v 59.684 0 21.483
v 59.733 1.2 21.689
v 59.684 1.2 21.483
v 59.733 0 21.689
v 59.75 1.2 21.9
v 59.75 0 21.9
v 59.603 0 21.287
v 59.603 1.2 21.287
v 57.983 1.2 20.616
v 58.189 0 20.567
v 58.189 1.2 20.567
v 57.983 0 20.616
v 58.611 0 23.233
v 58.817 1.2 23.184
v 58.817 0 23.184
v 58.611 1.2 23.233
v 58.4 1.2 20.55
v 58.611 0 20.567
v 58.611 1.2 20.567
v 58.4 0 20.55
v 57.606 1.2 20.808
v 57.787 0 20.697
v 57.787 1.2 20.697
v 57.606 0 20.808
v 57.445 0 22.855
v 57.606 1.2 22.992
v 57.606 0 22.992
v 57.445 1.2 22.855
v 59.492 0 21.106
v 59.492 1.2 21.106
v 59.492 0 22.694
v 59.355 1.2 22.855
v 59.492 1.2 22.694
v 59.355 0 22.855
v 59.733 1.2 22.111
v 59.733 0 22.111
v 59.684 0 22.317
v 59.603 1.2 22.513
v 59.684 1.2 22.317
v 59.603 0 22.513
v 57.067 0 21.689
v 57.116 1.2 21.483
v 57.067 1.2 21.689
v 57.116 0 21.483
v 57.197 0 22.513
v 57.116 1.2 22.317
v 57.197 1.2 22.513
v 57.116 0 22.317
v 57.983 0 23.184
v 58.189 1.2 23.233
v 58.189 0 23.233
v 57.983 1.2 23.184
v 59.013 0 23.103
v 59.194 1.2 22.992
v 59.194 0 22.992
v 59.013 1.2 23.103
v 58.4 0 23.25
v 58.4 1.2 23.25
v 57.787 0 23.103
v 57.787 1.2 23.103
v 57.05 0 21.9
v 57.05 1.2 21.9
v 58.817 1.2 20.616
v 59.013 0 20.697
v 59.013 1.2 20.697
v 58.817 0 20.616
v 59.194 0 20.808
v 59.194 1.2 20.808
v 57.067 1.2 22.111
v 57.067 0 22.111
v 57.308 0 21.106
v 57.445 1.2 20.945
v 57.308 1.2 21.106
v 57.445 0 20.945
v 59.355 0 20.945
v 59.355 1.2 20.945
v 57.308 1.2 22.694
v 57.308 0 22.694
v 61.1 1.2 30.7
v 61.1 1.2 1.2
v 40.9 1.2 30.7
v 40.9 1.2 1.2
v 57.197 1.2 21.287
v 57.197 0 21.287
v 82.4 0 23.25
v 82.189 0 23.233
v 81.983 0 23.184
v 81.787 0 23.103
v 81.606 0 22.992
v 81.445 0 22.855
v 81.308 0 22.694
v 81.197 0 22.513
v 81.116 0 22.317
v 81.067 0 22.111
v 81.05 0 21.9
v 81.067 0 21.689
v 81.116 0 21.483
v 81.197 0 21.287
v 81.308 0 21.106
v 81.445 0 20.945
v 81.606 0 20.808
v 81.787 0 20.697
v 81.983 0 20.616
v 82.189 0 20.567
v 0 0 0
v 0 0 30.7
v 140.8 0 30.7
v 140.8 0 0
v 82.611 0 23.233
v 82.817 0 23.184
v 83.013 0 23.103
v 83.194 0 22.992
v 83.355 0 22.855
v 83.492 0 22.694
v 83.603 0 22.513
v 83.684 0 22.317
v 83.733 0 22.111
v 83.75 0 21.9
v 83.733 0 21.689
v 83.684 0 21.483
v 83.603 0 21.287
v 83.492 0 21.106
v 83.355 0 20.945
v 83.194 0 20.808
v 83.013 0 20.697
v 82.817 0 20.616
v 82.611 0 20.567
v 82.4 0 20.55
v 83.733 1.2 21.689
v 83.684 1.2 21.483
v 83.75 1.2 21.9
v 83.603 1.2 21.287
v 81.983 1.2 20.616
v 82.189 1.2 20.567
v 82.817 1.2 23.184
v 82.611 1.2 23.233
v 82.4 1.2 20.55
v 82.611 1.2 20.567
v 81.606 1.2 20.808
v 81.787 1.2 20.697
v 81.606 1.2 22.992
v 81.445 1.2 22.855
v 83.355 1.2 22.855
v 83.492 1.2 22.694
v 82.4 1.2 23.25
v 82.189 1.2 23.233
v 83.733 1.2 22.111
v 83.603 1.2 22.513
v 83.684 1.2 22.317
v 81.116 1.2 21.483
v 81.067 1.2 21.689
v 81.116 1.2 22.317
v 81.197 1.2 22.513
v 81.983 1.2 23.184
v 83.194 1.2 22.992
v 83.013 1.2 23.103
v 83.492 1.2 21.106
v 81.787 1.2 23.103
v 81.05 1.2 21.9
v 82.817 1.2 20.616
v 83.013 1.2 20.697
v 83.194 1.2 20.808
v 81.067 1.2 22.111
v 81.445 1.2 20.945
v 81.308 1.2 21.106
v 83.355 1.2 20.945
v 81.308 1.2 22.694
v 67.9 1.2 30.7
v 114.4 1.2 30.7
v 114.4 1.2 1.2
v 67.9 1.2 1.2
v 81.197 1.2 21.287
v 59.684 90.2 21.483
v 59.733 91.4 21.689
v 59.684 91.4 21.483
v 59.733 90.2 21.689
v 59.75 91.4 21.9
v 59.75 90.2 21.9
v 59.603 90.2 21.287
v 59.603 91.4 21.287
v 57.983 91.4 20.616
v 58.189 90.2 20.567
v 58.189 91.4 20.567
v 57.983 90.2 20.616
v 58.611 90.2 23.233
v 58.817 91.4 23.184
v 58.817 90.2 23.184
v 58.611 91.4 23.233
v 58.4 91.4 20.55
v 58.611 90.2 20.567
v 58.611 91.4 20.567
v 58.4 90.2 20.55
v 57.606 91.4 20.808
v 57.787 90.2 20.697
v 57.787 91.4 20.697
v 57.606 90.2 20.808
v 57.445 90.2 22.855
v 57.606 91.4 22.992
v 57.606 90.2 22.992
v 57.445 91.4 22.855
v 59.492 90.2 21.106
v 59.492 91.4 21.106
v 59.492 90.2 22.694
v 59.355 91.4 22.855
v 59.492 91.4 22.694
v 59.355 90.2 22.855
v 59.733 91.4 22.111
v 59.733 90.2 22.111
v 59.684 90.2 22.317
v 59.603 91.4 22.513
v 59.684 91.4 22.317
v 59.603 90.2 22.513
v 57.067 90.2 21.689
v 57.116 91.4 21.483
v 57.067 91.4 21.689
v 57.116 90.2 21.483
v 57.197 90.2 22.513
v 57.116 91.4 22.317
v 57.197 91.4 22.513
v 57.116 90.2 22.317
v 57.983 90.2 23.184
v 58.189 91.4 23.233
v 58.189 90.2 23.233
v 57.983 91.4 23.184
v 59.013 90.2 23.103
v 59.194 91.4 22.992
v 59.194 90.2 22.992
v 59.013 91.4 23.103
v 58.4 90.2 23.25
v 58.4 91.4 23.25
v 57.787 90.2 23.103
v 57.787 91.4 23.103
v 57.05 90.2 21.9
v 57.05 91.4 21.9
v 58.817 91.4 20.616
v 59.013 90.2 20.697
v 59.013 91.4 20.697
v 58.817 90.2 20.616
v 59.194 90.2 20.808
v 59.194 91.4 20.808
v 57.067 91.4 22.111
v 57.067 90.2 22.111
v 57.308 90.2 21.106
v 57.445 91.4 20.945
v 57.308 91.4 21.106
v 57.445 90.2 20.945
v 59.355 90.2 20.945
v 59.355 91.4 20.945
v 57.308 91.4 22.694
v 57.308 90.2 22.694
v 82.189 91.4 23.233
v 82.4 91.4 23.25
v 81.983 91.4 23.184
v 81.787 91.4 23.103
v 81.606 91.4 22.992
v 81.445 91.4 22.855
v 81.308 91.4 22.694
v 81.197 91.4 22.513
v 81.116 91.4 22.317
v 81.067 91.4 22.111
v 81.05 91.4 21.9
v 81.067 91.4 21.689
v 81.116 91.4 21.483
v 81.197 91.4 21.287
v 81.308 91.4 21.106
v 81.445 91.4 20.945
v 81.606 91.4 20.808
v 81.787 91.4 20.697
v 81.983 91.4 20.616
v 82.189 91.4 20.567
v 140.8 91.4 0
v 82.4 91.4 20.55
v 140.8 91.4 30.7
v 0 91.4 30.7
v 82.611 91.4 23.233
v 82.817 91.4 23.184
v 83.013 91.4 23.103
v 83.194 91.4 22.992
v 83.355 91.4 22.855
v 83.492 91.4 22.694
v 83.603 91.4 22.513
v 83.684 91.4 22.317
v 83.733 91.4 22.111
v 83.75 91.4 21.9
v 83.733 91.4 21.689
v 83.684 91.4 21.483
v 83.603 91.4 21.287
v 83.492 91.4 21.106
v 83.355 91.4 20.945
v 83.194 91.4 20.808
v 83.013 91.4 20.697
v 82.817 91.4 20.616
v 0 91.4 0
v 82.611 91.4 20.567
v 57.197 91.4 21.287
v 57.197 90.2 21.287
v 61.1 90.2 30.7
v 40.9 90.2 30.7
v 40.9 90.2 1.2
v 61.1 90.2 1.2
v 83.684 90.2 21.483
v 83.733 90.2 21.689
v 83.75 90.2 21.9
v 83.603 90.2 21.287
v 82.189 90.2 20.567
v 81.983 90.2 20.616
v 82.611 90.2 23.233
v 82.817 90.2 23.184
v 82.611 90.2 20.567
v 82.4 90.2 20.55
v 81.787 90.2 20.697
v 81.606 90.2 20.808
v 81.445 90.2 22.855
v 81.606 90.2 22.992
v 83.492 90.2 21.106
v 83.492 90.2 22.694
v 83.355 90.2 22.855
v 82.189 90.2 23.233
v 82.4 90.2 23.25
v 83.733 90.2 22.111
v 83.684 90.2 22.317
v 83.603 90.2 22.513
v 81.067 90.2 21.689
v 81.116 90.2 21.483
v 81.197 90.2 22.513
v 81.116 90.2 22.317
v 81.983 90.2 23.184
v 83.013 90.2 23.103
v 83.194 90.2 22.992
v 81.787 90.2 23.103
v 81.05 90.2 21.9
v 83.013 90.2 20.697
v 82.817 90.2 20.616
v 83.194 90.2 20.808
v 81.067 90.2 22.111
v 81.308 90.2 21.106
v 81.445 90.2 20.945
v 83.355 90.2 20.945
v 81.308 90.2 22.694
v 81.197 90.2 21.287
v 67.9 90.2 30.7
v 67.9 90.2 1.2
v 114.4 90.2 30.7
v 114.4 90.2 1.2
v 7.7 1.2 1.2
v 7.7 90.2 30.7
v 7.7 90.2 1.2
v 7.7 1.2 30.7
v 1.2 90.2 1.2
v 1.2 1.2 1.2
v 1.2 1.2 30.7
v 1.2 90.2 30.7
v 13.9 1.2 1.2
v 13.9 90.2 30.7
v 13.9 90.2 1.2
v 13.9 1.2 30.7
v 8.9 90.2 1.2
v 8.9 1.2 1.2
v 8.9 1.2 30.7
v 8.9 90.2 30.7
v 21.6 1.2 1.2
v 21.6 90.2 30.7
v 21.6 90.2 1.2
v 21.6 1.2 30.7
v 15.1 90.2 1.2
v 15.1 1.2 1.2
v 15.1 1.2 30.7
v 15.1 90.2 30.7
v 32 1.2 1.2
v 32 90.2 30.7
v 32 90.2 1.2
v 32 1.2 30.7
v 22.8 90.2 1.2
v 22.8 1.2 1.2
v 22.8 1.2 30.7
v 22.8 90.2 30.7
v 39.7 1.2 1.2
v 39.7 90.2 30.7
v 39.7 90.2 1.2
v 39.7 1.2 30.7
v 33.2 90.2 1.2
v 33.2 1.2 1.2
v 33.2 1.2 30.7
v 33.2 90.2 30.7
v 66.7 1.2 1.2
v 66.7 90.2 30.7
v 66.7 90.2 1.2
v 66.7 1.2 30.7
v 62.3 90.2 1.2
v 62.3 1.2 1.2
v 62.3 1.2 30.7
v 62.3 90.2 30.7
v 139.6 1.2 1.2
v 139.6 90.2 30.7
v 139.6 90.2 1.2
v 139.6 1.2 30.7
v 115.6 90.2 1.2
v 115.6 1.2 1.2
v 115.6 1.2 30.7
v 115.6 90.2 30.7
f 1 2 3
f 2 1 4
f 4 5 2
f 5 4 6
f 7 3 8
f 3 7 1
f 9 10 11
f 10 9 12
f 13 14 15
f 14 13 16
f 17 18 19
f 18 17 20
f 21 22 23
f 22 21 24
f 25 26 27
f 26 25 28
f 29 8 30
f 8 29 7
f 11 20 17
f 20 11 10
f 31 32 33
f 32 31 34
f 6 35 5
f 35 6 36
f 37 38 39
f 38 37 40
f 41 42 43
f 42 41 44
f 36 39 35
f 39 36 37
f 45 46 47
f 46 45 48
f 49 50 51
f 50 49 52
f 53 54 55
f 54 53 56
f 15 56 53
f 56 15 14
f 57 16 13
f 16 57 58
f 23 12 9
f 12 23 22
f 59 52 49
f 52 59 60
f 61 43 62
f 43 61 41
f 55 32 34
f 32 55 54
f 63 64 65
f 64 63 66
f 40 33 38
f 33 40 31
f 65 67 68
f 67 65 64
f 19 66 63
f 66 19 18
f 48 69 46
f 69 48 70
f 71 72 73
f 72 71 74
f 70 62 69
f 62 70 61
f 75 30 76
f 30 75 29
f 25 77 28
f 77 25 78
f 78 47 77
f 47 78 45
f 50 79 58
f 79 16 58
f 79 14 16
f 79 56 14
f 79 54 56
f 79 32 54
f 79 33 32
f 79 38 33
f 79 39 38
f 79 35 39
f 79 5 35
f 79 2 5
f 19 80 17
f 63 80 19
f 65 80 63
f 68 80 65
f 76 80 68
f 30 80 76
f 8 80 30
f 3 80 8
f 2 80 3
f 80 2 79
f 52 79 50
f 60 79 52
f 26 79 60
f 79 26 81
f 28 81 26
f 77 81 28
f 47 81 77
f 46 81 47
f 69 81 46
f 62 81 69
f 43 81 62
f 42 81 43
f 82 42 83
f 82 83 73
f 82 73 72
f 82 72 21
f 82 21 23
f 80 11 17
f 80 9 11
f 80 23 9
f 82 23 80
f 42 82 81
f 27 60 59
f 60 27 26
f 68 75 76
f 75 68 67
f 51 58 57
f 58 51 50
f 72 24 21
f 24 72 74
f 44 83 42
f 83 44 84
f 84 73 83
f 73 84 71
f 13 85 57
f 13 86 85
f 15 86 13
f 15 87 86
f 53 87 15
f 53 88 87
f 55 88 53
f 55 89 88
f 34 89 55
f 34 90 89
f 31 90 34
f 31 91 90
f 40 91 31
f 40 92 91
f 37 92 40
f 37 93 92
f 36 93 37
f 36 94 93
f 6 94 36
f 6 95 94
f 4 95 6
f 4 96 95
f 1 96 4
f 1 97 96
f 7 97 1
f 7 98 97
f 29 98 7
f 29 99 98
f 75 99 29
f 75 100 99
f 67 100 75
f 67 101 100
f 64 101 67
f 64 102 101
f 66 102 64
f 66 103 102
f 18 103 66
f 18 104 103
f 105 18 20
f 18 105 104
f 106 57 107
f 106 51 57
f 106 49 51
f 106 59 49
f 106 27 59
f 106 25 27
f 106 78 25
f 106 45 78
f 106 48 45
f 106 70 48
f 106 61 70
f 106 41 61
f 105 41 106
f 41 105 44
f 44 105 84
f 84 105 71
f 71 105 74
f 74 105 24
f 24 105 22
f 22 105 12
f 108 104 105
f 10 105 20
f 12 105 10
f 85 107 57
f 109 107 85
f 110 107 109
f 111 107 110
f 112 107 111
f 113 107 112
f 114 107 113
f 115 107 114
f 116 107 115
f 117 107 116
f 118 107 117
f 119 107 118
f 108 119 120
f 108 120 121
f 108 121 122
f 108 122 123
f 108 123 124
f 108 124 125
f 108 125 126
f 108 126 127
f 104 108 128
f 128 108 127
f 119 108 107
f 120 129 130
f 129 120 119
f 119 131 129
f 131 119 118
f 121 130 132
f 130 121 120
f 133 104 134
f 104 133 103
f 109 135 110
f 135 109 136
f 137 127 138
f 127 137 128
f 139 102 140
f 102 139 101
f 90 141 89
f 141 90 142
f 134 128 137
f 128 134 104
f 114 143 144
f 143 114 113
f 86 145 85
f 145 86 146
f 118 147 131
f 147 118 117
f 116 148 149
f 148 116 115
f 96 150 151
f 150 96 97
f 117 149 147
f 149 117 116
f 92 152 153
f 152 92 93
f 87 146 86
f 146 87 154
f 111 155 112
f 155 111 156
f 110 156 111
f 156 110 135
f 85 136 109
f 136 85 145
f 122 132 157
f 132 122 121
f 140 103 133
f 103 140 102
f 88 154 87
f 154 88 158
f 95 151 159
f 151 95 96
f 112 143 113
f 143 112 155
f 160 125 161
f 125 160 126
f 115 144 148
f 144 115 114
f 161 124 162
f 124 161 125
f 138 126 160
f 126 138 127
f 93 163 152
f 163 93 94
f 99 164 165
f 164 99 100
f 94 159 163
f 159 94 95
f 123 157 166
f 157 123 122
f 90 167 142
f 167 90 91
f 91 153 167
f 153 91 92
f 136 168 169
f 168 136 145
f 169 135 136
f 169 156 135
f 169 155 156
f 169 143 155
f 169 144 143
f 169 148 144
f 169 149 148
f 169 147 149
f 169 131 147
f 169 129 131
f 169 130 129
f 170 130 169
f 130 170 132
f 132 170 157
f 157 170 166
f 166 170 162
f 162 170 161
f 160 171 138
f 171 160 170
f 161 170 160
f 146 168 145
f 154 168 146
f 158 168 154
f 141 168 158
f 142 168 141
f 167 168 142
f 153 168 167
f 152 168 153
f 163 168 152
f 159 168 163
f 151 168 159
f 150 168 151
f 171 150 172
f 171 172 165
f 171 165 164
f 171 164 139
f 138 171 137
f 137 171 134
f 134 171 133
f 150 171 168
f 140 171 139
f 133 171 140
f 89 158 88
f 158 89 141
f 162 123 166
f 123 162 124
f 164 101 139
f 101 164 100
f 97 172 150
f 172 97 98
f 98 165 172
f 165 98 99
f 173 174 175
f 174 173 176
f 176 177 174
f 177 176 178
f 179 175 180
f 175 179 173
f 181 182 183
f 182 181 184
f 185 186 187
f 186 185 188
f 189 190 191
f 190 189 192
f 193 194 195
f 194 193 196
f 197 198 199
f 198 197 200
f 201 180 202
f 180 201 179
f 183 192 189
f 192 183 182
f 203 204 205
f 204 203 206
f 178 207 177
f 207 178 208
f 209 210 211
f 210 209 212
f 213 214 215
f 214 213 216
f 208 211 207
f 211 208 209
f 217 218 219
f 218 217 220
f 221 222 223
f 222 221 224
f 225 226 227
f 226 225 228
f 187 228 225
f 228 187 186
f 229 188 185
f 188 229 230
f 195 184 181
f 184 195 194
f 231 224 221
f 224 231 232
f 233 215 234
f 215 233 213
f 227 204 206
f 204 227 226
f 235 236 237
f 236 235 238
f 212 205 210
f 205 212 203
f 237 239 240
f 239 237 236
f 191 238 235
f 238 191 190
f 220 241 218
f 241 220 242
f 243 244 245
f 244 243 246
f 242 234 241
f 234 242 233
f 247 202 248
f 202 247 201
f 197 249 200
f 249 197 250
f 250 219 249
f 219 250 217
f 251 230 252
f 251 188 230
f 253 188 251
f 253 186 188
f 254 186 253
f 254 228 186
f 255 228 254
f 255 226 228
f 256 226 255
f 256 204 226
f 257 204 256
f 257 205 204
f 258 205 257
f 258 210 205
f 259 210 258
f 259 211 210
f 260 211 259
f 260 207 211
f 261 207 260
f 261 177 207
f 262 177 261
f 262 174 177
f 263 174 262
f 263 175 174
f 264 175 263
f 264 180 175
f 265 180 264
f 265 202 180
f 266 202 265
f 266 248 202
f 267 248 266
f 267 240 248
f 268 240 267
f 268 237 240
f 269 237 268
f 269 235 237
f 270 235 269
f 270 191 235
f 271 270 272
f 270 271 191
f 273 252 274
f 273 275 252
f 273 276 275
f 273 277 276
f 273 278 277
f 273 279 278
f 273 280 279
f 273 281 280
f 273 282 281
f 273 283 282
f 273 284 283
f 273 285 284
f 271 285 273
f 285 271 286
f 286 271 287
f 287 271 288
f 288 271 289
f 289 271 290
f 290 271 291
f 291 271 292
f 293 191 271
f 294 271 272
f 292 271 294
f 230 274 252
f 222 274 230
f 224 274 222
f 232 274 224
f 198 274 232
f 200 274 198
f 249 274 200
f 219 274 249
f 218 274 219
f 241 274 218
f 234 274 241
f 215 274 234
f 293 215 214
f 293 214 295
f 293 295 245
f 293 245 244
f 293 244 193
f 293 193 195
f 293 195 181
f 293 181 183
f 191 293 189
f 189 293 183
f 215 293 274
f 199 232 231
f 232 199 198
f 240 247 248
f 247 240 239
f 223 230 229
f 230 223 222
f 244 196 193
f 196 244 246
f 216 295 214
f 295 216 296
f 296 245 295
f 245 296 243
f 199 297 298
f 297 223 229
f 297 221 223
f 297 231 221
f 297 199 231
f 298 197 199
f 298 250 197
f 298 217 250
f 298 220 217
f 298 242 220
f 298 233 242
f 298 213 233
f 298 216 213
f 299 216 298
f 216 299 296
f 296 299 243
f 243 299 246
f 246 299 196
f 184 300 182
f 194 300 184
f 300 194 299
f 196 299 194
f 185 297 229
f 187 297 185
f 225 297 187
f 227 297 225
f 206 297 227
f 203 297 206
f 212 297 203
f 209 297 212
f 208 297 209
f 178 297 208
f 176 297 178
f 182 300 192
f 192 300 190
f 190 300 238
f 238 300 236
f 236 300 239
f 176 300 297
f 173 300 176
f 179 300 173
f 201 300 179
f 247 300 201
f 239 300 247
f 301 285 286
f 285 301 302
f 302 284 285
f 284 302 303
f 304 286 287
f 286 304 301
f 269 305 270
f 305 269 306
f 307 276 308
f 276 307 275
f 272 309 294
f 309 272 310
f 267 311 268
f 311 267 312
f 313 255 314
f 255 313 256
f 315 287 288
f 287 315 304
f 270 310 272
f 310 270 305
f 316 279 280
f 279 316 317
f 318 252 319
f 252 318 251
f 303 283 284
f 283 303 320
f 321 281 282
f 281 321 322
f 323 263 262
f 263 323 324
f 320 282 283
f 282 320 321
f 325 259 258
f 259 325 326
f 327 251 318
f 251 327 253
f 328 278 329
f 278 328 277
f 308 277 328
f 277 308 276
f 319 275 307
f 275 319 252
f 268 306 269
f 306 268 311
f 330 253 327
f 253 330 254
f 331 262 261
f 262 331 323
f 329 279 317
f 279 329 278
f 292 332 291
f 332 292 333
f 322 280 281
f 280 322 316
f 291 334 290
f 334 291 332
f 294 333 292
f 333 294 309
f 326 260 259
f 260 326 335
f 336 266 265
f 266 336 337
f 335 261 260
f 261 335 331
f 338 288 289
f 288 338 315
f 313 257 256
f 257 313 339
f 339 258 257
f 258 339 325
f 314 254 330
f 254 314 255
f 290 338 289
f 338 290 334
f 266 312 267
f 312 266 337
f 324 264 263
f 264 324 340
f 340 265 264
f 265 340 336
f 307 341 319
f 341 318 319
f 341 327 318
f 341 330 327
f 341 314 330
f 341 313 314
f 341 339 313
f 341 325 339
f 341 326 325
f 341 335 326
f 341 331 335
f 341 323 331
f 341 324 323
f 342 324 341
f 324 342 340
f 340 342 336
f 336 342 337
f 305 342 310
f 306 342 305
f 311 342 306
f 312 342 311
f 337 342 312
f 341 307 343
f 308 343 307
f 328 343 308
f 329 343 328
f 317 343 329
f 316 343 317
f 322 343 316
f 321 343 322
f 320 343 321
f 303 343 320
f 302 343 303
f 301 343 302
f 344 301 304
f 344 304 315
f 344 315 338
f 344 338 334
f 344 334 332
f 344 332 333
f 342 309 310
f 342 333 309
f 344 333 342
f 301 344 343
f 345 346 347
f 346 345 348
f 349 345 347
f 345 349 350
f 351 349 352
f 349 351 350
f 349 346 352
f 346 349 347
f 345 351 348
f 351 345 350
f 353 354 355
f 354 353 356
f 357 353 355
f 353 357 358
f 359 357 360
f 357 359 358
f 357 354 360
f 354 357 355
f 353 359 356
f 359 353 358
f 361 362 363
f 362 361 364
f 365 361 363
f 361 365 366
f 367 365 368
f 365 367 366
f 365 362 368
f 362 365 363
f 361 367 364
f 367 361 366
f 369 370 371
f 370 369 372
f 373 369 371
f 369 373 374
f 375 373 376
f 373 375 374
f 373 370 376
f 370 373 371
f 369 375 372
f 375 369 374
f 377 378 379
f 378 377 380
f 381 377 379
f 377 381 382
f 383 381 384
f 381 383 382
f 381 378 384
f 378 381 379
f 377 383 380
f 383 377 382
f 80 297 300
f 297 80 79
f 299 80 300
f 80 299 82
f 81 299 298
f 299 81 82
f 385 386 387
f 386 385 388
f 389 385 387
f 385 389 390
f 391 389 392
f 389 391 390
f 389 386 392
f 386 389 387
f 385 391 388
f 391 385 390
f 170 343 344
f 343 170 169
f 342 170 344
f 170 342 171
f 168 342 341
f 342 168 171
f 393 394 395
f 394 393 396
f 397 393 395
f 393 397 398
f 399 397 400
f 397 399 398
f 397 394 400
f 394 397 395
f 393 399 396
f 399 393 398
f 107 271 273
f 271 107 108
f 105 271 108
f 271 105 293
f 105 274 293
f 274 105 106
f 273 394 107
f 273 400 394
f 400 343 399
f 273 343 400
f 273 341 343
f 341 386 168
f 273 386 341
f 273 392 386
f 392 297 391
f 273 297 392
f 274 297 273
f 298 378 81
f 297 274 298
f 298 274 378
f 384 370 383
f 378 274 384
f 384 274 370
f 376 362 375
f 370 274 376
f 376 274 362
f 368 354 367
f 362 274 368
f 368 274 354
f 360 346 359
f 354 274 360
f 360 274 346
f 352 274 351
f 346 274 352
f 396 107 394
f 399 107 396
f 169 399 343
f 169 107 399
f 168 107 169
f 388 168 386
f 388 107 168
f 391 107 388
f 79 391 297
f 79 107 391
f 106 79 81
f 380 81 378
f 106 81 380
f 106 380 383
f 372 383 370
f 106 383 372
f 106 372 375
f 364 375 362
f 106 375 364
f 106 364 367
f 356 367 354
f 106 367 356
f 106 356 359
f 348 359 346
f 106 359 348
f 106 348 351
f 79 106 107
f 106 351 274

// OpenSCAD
//All dimensions are in mm

Wall = 1.2;
Space = 2;

Card_x = 87 + Space;
Card_y = 57 + Space;
Card_z = 0.3;

Card_Fistful = 15;
Card_Fistful_z = (Card_Fistful * Card_z) + Space;
Card_WildWest = 10;
Card_WildWest_z = (Card_WildWest * Card_z) + Space;
Card_HighNoon = 15;
Card_HighNoon_z = (Card_HighNoon * Card_z) + Space;
Card_GoldRush = 24;
Card_GoldRush_z = (Card_GoldRush * Card_z) + Space;

Card_Role = 15;
Card_Role_z = (Card_Role * Card_z) + Space;
Card_Persons = 54;
Card_Persons_z = (Card_Persons * Card_z) + (2 * Space);

Card_Advice = 8;
Card_Advice_z = (Card_Advice * Card_z) + Space;

Card_Other = 135;
Card_Other_z = (Card_Other * Card_z) + (3 * Space);

Gold_x = Card_x;
Gold_y = Card_y;
Gold_z = 24;

Slots = 9;

Magnet_dia = 9.5 + 0.2;
Magnet_h = 3.3 + 0.2;

Hinge_Holes = 24;
Hinge_HoleAxis = 8.8;
Hinge_HolesDia = 2.7;

Show_DownBlock = true;
Show_UpBlockLeft = false;
Show_UpBlockRight = false;

module Block_Down()
{
  difference()
  {
    cube([((Slots + 1) * Wall) + Card_Fistful_z + Card_WildWest_z + Card_HighNoon_z + Card_GoldRush_z + Card_Role_z + Card_Persons_z + Card_Advice_z + Card_Other_z + Gold_z, (2 * Wall) + Card_x, (2 * Wall) + Card_y]);
    union()
    {
      translate([((((Slots + 1) * Wall) + Card_Fistful_z + Card_WildWest_z + Card_HighNoon_z + Card_GoldRush_z + Card_Role_z + Card_Persons_z + Card_Advice_z + Card_Other_z + Gold_z) / 2) - (Hinge_Holes / 2), 0, (((2 * Wall) + Card_y) / 2) - Hinge_HoleAxis])
      {
        rotate([-90, 0, 0])
        {
          cylinder(d = Hinge_HolesDia, h = Wall, $fn = 40);
        }
      }
      translate([((((Slots + 1) * Wall) + Card_Fistful_z + Card_WildWest_z + Card_HighNoon_z + Card_GoldRush_z + Card_Role_z + Card_Persons_z + Card_Advice_z + Card_Other_z + Gold_z) / 2) + (Hinge_Holes / 2), 0, (((2 * Wall) + Card_y) / 2) - Hinge_HoleAxis])
      {
        rotate([-90, 0, 0])
        {
          cylinder(d = Hinge_HolesDia, h = Wall, $fn = 40);
        }
      }
      translate([((((Slots + 1) * Wall) + Card_Fistful_z + Card_WildWest_z + Card_HighNoon_z + Card_GoldRush_z + Card_Role_z + Card_Persons_z + Card_Advice_z + Card_Other_z + Gold_z) / 2) - (Hinge_Holes / 2), Wall + Card_x, (((2 * Wall) + Card_y) / 2) - Hinge_HoleAxis])
      {
        rotate([-90, 0, 0])
        {
          cylinder(d = Hinge_HolesDia, h = Wall, $fn = 40);
        }
      }
      translate([((((Slots + 1) * Wall) + Card_Fistful_z + Card_WildWest_z + Card_HighNoon_z + Card_GoldRush_z + Card_Role_z + Card_Persons_z + Card_Advice_z + Card_Other_z + Gold_z) / 2) + (Hinge_Holes / 2), Wall + Card_x, (((2 * Wall) + Card_y) / 2) - Hinge_HoleAxis])
      {
        rotate([-90, 0, 0])
        {
          cylinder(d = Hinge_HolesDia, h = Wall, $fn = 40);
        }
      }
      translate([(1 * Wall), Wall, Wall])
      {
        cube([Card_Fistful_z, Card_x, Card_y]);
      }
      translate([(2 * Wall) + Card_Fistful_z, Wall, Wall])
      {
        cube([Card_WildWest_z, Card_x, Card_y]);
      }
      translate([(3 * Wall) + Card_Fistful_z + Card_WildWest_z, Wall, Wall])
      {
        cube([Card_HighNoon_z, Card_x, Card_y]);
      }
      translate([(4 * Wall) + Card_Fistful_z + Card_WildWest_z + Card_HighNoon_z, Wall, Wall])
      {
        cube([Card_GoldRush_z, Card_x, Card_y]);
      }
      translate([(5 * Wall) + Card_Fistful_z + Card_WildWest_z + Card_HighNoon_z + Card_GoldRush_z, Wall, Wall])
      {
        cube([Card_Role_z, Card_x, Card_y]);
      }
      translate([(6 * Wall) + Card_Fistful_z + Card_WildWest_z + Card_HighNoon_z + Card_GoldRush_z + Card_Role_z, Wall, Wall])
      {
        cube([Card_Persons_z, Card_x, Card_y]);
      }
      translate([(7 * Wall) + Card_Fistful_z + Card_WildWest_z + Card_HighNoon_z + Card_GoldRush_z + Card_Role_z + Card_Persons_z, Wall, Wall])
      {
        cube([Card_Advice_z, Card_x, Card_y]);
      }
      translate([(8 * Wall) + Card_Fistful_z + Card_WildWest_z + Card_HighNoon_z + Card_GoldRush_z + Card_Role_z + Card_Persons_z + Card_Advice_z, Wall, Wall])
      {
        cube([Card_Other_z, Card_x, Card_y]);
      }
      translate([(9 * Wall) + Card_Fistful_z + Card_WildWest_z + Card_HighNoon_z + Card_GoldRush_z + Card_Role_z + Card_Persons_z + Card_Advice_z + Card_Other_z, Wall, Wall])
      {
        cube([Gold_z, Card_x, Card_y]);
      }
    }
  }
}

module Block_Up()
{
  difference()
  {
    cube([((Slots + 1) * Wall) + Card_Fistful_z + Card_WildWest_z + Card_HighNoon_z + Card_GoldRush_z + Card_Role_z + Card_Persons_z + Card_Advice_z + Card_Other_z + Gold_z, (2 * Wall) + Card_x, (2 * Wall) + Card_y]);
    union()
    {
      translate([(Wall), Wall, Wall])
      {
        cube([((Slots - 1) * Wall) + Card_Fistful_z + Card_WildWest_z + Card_HighNoon_z + Card_GoldRush_z + Card_Role_z + Card_Persons_z + Card_Advice_z + Card_Other_z + Gold_z, Card_x, Card_y]);
      }
      translate([((((Slots + 1) * Wall) + Card_Fistful_z + Card_WildWest_z + Card_HighNoon_z + Card_GoldRush_z + Card_Role_z + Card_Persons_z + Card_Advice_z + Card_Other_z + Gold_z) / 2) - (Hinge_Holes / 2), 0, (((2 * Wall) + Card_y) / 2) - Hinge_HoleAxis])
      {
        rotate([-90, 0, 0])
        {
          cylinder(d = Hinge_HolesDia, h = Wall, $fn = 40);
        }
      }
      translate([((((Slots + 1) * Wall) + Card_Fistful_z + Card_WildWest_z + Card_HighNoon_z + Card_GoldRush_z + Card_Role_z + Card_Persons_z + Card_Advice_z + Card_Other_z + Gold_z) / 2) + (Hinge_Holes / 2), 0, (((2 * Wall) + Card_y) / 2) - Hinge_HoleAxis])
      {
        rotate([-90, 0, 0])
        {
          cylinder(d = Hinge_HolesDia, h = Wall, $fn = 40);
        }
      }
      translate([((((Slots + 1) * Wall) + Card_Fistful_z + Card_WildWest_z + Card_HighNoon_z + Card_GoldRush_z + Card_Role_z + Card_Persons_z + Card_Advice_z + Card_Other_z + Gold_z) / 2) - (Hinge_Holes / 2), Wall + Card_x, (((2 * Wall) + Card_y) / 2) - Hinge_HoleAxis])
      {
        rotate([-90, 0, 0])
        {
          cylinder(d = Hinge_HolesDia, h = Wall, $fn = 40);
        }
      }
      translate([((((Slots + 1) * Wall) + Card_Fistful_z + Card_WildWest_z + Card_HighNoon_z + Card_GoldRush_z + Card_Role_z + Card_Persons_z + Card_Advice_z + Card_Other_z + Gold_z) / 2) + (Hinge_Holes / 2), Wall + Card_x, (((2 * Wall) + Card_y) / 2) - Hinge_HoleAxis])
      {
        rotate([-90, 0, 0])
        {
          cylinder(d = Hinge_HolesDia, h = Wall, $fn = 40);
        }
      }
    }
  }
}
module MagnetSlot()
{
    difference()
    {
      cube([Magnet_dia + Wall, Magnet_h + Wall, Magnet_dia + Wall]);
      union()
      {
        translate([Magnet_dia / 2, Wall, Magnet_dia / 2])
        {
          rotate([-90, 0, 0])
          {
            cylinder(d = Magnet_dia, h = Magnet_h, $fn = 40);
          }
        }
      }
      translate([Magnet_dia / 2, -0.0001, Magnet_dia / 2])
      {
        rotate([-90, -90, 0])
        {
          intersection()
          {
            difference()
            {
              cylinder(d = Magnet_dia + 7*Wall, h = Magnet_h + Wall+1, $fn = 40);
              cylinder(d = Magnet_dia + 2*Wall, h = Magnet_h + Wall+1, $fn = 40);
            }
            translate([0, 0, 0])
            {
              cube([Magnet_dia + 5*Wall, Magnet_dia + 3*Wall, Magnet_h + Wall+1]);
            }
          }
        }
      }
    }
  
}
if(Show_DownBlock)
{
  difference()
  {
    Block_Down();
    translate([0, 0, ((2 * Wall) + Card_y) / 2])
    {
      cube([((Slots + 1) * Wall) + Card_Fistful_z + Card_WildWest_z + Card_HighNoon_z + Card_GoldRush_z + Card_Role_z + Card_Persons_z + Card_Advice_z + Card_Other_z + Gold_z, (2 * Wall) + Card_x, ((2 * Wall) + Card_y) / 2]);
    }
  }
}
if(Show_UpBlockLeft)
{
  union()
  {
    translate([Wall, (((2 * Wall) + Card_x) / 2) - (Magnet_h + Wall), Wall])
    {
      MagnetSlot();
    }
    intersection()
    {
      Block_Up();

      cube([((Slots + 1) * Wall) + Card_Fistful_z + Card_WildWest_z + Card_HighNoon_z + Card_GoldRush_z + Card_Role_z + Card_Persons_z + Card_Advice_z + Card_Other_z + Gold_z, ((2 * Wall) + Card_x) / 2, ((2 * Wall) + Card_y) / 2]);
    }
  }
}
if(Show_UpBlockRight)
{
  union()
  {
    translate([((Slots + 1) * Wall) + Card_Fistful_z + Card_WildWest_z + Card_HighNoon_z + Card_GoldRush_z + Card_Role_z + Card_Persons_z + Card_Advice_z + Card_Other_z + Gold_z - (Wall), (((2 * Wall) + Card_x) / 2) - (Magnet_h + Wall), Wall])
    {
      rotate([0, -90, 0])
      {
        MagnetSlot();
      }
    }
    intersection()
    {
      Block_Up();

      cube([((Slots + 1) * Wall) + Card_Fistful_z + Card_WildWest_z + Card_HighNoon_z + Card_GoldRush_z + Card_Role_z + Card_Persons_z + Card_Advice_z + Card_Other_z + Gold_z, ((2 * Wall) + Card_x) / 2, ((2 * Wall) + Card_y) / 2]);
    }
  }
}
